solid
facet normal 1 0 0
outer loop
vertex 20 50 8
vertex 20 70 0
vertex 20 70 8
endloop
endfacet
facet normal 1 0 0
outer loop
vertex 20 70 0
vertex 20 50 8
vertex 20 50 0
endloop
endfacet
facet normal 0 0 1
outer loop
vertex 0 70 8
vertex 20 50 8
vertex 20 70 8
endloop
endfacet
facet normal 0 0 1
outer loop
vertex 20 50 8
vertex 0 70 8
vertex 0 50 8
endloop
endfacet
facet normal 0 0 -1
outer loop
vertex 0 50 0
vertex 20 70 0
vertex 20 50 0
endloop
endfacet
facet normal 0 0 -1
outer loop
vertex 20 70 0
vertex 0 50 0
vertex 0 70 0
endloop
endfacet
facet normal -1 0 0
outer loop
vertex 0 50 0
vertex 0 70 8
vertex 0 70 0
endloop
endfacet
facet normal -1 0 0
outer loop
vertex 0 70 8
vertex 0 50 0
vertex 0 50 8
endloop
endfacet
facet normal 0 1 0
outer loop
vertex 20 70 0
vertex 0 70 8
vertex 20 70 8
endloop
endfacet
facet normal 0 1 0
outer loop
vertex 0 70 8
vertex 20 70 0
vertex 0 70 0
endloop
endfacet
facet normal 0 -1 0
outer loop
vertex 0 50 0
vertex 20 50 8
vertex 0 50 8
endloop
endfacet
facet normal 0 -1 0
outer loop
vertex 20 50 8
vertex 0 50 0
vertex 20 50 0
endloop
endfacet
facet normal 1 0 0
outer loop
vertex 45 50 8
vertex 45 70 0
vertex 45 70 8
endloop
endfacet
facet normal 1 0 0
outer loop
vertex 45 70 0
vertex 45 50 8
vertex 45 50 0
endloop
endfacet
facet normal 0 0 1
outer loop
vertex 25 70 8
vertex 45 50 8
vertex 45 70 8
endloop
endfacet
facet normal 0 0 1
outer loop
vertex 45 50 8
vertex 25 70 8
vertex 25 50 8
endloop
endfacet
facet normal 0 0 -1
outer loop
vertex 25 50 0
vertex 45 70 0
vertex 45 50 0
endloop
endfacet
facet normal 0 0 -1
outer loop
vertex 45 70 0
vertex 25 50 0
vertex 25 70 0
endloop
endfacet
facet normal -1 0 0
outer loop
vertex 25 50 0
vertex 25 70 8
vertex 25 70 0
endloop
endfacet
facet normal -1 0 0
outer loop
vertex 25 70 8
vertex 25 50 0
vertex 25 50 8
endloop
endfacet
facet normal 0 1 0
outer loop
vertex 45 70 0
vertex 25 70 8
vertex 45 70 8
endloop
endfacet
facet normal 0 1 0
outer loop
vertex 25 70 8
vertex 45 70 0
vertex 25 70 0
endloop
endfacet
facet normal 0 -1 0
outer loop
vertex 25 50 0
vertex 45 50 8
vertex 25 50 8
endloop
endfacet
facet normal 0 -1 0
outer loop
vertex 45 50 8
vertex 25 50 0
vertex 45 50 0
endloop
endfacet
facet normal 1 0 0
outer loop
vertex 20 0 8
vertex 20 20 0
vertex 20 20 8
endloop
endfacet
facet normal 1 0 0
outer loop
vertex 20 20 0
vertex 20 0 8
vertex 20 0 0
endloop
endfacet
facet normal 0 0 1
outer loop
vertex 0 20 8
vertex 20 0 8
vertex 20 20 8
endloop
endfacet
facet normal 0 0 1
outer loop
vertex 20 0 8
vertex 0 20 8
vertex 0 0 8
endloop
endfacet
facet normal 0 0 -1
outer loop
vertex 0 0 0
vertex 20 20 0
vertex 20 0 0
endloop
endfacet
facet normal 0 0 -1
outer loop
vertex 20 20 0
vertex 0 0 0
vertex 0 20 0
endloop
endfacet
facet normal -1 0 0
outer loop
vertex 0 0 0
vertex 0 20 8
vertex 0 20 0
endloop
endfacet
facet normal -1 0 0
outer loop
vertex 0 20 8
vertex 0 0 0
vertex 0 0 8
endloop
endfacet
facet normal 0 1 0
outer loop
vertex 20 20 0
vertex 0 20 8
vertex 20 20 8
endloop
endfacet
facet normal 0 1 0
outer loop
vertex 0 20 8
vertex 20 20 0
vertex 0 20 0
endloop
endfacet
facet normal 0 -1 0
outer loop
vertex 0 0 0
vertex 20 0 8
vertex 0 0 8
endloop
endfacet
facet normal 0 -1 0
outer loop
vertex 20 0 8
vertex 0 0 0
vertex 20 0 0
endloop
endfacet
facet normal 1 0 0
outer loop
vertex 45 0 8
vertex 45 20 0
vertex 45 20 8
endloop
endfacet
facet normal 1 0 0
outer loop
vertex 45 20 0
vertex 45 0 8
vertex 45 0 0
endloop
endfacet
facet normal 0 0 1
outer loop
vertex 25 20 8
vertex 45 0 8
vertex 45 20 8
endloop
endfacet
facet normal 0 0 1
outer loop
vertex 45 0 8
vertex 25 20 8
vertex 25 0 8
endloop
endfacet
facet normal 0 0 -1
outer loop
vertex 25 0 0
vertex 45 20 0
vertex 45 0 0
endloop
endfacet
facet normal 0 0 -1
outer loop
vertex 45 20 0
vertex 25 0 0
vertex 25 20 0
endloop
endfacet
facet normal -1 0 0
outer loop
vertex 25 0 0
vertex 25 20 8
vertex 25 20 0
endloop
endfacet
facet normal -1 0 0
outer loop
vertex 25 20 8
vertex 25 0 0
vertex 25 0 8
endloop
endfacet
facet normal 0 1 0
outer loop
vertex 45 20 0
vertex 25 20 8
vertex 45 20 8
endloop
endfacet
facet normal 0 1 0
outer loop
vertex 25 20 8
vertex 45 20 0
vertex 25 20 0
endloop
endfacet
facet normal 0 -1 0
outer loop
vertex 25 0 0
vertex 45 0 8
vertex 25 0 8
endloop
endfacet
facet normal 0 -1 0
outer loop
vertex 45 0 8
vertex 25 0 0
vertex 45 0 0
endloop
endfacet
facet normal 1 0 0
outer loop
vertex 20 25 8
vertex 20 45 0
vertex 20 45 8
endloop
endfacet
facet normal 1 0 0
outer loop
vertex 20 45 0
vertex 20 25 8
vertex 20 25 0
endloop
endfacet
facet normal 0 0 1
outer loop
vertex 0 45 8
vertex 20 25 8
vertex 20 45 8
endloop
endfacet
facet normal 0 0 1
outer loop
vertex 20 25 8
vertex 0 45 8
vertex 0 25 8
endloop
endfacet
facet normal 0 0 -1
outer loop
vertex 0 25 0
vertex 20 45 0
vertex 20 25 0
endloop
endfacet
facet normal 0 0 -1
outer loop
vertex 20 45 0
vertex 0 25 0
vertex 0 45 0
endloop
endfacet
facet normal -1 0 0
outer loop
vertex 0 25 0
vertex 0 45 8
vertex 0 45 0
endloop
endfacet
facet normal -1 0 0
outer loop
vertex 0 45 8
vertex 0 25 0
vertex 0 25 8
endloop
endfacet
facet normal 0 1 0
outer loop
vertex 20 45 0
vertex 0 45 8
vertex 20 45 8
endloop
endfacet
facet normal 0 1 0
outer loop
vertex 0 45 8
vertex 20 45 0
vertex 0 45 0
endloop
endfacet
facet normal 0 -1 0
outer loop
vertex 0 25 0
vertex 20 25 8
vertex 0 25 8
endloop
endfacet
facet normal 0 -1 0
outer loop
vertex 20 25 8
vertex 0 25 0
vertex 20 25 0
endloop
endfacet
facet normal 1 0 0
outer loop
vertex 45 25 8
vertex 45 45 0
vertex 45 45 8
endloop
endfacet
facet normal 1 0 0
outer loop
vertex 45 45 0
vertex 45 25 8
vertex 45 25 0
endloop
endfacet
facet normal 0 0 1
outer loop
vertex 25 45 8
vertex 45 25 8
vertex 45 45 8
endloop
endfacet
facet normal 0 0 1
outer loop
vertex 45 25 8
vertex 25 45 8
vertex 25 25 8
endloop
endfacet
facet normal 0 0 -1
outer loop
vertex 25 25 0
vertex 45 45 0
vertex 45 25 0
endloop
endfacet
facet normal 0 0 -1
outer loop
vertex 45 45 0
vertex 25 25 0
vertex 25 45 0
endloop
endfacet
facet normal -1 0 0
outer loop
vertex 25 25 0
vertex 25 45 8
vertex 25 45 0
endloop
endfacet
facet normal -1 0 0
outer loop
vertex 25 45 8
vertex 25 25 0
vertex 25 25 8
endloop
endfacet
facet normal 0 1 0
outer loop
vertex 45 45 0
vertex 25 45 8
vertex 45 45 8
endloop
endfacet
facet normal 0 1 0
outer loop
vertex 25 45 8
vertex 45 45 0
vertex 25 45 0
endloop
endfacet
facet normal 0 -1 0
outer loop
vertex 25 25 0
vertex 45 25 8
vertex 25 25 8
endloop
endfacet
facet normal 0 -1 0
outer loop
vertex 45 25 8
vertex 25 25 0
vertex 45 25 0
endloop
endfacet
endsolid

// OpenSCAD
// color(): how a shape is drawn.
//
// Color is a preview and export property, not a geometric one -- it
// changes nothing about the solid, and a boolean takes the color of its
// first child.

color("tomato")    cube([20, 20, 8]);
color("steelblue") translate([25, 0, 0]) cube([20, 20, 8]);

// By name, by RGB, and with an alpha for transparency.
color([0.2, 0.8, 0.4])      translate([0, 25, 0]) cube([20, 20, 8]);
color([0.2, 0.8, 0.4, 0.35]) translate([25, 25, 0]) cube([20, 20, 8]);

// A color applies to everything below it, and overrides any color set
// inside it: the outer color() wins, so both of these are gold.
translate([0, 50, 0])
    color("gold") {
        cube([20, 20, 8]);
        color("purple") translate([25, 0, 0]) cube([20, 20, 8]);
    }
